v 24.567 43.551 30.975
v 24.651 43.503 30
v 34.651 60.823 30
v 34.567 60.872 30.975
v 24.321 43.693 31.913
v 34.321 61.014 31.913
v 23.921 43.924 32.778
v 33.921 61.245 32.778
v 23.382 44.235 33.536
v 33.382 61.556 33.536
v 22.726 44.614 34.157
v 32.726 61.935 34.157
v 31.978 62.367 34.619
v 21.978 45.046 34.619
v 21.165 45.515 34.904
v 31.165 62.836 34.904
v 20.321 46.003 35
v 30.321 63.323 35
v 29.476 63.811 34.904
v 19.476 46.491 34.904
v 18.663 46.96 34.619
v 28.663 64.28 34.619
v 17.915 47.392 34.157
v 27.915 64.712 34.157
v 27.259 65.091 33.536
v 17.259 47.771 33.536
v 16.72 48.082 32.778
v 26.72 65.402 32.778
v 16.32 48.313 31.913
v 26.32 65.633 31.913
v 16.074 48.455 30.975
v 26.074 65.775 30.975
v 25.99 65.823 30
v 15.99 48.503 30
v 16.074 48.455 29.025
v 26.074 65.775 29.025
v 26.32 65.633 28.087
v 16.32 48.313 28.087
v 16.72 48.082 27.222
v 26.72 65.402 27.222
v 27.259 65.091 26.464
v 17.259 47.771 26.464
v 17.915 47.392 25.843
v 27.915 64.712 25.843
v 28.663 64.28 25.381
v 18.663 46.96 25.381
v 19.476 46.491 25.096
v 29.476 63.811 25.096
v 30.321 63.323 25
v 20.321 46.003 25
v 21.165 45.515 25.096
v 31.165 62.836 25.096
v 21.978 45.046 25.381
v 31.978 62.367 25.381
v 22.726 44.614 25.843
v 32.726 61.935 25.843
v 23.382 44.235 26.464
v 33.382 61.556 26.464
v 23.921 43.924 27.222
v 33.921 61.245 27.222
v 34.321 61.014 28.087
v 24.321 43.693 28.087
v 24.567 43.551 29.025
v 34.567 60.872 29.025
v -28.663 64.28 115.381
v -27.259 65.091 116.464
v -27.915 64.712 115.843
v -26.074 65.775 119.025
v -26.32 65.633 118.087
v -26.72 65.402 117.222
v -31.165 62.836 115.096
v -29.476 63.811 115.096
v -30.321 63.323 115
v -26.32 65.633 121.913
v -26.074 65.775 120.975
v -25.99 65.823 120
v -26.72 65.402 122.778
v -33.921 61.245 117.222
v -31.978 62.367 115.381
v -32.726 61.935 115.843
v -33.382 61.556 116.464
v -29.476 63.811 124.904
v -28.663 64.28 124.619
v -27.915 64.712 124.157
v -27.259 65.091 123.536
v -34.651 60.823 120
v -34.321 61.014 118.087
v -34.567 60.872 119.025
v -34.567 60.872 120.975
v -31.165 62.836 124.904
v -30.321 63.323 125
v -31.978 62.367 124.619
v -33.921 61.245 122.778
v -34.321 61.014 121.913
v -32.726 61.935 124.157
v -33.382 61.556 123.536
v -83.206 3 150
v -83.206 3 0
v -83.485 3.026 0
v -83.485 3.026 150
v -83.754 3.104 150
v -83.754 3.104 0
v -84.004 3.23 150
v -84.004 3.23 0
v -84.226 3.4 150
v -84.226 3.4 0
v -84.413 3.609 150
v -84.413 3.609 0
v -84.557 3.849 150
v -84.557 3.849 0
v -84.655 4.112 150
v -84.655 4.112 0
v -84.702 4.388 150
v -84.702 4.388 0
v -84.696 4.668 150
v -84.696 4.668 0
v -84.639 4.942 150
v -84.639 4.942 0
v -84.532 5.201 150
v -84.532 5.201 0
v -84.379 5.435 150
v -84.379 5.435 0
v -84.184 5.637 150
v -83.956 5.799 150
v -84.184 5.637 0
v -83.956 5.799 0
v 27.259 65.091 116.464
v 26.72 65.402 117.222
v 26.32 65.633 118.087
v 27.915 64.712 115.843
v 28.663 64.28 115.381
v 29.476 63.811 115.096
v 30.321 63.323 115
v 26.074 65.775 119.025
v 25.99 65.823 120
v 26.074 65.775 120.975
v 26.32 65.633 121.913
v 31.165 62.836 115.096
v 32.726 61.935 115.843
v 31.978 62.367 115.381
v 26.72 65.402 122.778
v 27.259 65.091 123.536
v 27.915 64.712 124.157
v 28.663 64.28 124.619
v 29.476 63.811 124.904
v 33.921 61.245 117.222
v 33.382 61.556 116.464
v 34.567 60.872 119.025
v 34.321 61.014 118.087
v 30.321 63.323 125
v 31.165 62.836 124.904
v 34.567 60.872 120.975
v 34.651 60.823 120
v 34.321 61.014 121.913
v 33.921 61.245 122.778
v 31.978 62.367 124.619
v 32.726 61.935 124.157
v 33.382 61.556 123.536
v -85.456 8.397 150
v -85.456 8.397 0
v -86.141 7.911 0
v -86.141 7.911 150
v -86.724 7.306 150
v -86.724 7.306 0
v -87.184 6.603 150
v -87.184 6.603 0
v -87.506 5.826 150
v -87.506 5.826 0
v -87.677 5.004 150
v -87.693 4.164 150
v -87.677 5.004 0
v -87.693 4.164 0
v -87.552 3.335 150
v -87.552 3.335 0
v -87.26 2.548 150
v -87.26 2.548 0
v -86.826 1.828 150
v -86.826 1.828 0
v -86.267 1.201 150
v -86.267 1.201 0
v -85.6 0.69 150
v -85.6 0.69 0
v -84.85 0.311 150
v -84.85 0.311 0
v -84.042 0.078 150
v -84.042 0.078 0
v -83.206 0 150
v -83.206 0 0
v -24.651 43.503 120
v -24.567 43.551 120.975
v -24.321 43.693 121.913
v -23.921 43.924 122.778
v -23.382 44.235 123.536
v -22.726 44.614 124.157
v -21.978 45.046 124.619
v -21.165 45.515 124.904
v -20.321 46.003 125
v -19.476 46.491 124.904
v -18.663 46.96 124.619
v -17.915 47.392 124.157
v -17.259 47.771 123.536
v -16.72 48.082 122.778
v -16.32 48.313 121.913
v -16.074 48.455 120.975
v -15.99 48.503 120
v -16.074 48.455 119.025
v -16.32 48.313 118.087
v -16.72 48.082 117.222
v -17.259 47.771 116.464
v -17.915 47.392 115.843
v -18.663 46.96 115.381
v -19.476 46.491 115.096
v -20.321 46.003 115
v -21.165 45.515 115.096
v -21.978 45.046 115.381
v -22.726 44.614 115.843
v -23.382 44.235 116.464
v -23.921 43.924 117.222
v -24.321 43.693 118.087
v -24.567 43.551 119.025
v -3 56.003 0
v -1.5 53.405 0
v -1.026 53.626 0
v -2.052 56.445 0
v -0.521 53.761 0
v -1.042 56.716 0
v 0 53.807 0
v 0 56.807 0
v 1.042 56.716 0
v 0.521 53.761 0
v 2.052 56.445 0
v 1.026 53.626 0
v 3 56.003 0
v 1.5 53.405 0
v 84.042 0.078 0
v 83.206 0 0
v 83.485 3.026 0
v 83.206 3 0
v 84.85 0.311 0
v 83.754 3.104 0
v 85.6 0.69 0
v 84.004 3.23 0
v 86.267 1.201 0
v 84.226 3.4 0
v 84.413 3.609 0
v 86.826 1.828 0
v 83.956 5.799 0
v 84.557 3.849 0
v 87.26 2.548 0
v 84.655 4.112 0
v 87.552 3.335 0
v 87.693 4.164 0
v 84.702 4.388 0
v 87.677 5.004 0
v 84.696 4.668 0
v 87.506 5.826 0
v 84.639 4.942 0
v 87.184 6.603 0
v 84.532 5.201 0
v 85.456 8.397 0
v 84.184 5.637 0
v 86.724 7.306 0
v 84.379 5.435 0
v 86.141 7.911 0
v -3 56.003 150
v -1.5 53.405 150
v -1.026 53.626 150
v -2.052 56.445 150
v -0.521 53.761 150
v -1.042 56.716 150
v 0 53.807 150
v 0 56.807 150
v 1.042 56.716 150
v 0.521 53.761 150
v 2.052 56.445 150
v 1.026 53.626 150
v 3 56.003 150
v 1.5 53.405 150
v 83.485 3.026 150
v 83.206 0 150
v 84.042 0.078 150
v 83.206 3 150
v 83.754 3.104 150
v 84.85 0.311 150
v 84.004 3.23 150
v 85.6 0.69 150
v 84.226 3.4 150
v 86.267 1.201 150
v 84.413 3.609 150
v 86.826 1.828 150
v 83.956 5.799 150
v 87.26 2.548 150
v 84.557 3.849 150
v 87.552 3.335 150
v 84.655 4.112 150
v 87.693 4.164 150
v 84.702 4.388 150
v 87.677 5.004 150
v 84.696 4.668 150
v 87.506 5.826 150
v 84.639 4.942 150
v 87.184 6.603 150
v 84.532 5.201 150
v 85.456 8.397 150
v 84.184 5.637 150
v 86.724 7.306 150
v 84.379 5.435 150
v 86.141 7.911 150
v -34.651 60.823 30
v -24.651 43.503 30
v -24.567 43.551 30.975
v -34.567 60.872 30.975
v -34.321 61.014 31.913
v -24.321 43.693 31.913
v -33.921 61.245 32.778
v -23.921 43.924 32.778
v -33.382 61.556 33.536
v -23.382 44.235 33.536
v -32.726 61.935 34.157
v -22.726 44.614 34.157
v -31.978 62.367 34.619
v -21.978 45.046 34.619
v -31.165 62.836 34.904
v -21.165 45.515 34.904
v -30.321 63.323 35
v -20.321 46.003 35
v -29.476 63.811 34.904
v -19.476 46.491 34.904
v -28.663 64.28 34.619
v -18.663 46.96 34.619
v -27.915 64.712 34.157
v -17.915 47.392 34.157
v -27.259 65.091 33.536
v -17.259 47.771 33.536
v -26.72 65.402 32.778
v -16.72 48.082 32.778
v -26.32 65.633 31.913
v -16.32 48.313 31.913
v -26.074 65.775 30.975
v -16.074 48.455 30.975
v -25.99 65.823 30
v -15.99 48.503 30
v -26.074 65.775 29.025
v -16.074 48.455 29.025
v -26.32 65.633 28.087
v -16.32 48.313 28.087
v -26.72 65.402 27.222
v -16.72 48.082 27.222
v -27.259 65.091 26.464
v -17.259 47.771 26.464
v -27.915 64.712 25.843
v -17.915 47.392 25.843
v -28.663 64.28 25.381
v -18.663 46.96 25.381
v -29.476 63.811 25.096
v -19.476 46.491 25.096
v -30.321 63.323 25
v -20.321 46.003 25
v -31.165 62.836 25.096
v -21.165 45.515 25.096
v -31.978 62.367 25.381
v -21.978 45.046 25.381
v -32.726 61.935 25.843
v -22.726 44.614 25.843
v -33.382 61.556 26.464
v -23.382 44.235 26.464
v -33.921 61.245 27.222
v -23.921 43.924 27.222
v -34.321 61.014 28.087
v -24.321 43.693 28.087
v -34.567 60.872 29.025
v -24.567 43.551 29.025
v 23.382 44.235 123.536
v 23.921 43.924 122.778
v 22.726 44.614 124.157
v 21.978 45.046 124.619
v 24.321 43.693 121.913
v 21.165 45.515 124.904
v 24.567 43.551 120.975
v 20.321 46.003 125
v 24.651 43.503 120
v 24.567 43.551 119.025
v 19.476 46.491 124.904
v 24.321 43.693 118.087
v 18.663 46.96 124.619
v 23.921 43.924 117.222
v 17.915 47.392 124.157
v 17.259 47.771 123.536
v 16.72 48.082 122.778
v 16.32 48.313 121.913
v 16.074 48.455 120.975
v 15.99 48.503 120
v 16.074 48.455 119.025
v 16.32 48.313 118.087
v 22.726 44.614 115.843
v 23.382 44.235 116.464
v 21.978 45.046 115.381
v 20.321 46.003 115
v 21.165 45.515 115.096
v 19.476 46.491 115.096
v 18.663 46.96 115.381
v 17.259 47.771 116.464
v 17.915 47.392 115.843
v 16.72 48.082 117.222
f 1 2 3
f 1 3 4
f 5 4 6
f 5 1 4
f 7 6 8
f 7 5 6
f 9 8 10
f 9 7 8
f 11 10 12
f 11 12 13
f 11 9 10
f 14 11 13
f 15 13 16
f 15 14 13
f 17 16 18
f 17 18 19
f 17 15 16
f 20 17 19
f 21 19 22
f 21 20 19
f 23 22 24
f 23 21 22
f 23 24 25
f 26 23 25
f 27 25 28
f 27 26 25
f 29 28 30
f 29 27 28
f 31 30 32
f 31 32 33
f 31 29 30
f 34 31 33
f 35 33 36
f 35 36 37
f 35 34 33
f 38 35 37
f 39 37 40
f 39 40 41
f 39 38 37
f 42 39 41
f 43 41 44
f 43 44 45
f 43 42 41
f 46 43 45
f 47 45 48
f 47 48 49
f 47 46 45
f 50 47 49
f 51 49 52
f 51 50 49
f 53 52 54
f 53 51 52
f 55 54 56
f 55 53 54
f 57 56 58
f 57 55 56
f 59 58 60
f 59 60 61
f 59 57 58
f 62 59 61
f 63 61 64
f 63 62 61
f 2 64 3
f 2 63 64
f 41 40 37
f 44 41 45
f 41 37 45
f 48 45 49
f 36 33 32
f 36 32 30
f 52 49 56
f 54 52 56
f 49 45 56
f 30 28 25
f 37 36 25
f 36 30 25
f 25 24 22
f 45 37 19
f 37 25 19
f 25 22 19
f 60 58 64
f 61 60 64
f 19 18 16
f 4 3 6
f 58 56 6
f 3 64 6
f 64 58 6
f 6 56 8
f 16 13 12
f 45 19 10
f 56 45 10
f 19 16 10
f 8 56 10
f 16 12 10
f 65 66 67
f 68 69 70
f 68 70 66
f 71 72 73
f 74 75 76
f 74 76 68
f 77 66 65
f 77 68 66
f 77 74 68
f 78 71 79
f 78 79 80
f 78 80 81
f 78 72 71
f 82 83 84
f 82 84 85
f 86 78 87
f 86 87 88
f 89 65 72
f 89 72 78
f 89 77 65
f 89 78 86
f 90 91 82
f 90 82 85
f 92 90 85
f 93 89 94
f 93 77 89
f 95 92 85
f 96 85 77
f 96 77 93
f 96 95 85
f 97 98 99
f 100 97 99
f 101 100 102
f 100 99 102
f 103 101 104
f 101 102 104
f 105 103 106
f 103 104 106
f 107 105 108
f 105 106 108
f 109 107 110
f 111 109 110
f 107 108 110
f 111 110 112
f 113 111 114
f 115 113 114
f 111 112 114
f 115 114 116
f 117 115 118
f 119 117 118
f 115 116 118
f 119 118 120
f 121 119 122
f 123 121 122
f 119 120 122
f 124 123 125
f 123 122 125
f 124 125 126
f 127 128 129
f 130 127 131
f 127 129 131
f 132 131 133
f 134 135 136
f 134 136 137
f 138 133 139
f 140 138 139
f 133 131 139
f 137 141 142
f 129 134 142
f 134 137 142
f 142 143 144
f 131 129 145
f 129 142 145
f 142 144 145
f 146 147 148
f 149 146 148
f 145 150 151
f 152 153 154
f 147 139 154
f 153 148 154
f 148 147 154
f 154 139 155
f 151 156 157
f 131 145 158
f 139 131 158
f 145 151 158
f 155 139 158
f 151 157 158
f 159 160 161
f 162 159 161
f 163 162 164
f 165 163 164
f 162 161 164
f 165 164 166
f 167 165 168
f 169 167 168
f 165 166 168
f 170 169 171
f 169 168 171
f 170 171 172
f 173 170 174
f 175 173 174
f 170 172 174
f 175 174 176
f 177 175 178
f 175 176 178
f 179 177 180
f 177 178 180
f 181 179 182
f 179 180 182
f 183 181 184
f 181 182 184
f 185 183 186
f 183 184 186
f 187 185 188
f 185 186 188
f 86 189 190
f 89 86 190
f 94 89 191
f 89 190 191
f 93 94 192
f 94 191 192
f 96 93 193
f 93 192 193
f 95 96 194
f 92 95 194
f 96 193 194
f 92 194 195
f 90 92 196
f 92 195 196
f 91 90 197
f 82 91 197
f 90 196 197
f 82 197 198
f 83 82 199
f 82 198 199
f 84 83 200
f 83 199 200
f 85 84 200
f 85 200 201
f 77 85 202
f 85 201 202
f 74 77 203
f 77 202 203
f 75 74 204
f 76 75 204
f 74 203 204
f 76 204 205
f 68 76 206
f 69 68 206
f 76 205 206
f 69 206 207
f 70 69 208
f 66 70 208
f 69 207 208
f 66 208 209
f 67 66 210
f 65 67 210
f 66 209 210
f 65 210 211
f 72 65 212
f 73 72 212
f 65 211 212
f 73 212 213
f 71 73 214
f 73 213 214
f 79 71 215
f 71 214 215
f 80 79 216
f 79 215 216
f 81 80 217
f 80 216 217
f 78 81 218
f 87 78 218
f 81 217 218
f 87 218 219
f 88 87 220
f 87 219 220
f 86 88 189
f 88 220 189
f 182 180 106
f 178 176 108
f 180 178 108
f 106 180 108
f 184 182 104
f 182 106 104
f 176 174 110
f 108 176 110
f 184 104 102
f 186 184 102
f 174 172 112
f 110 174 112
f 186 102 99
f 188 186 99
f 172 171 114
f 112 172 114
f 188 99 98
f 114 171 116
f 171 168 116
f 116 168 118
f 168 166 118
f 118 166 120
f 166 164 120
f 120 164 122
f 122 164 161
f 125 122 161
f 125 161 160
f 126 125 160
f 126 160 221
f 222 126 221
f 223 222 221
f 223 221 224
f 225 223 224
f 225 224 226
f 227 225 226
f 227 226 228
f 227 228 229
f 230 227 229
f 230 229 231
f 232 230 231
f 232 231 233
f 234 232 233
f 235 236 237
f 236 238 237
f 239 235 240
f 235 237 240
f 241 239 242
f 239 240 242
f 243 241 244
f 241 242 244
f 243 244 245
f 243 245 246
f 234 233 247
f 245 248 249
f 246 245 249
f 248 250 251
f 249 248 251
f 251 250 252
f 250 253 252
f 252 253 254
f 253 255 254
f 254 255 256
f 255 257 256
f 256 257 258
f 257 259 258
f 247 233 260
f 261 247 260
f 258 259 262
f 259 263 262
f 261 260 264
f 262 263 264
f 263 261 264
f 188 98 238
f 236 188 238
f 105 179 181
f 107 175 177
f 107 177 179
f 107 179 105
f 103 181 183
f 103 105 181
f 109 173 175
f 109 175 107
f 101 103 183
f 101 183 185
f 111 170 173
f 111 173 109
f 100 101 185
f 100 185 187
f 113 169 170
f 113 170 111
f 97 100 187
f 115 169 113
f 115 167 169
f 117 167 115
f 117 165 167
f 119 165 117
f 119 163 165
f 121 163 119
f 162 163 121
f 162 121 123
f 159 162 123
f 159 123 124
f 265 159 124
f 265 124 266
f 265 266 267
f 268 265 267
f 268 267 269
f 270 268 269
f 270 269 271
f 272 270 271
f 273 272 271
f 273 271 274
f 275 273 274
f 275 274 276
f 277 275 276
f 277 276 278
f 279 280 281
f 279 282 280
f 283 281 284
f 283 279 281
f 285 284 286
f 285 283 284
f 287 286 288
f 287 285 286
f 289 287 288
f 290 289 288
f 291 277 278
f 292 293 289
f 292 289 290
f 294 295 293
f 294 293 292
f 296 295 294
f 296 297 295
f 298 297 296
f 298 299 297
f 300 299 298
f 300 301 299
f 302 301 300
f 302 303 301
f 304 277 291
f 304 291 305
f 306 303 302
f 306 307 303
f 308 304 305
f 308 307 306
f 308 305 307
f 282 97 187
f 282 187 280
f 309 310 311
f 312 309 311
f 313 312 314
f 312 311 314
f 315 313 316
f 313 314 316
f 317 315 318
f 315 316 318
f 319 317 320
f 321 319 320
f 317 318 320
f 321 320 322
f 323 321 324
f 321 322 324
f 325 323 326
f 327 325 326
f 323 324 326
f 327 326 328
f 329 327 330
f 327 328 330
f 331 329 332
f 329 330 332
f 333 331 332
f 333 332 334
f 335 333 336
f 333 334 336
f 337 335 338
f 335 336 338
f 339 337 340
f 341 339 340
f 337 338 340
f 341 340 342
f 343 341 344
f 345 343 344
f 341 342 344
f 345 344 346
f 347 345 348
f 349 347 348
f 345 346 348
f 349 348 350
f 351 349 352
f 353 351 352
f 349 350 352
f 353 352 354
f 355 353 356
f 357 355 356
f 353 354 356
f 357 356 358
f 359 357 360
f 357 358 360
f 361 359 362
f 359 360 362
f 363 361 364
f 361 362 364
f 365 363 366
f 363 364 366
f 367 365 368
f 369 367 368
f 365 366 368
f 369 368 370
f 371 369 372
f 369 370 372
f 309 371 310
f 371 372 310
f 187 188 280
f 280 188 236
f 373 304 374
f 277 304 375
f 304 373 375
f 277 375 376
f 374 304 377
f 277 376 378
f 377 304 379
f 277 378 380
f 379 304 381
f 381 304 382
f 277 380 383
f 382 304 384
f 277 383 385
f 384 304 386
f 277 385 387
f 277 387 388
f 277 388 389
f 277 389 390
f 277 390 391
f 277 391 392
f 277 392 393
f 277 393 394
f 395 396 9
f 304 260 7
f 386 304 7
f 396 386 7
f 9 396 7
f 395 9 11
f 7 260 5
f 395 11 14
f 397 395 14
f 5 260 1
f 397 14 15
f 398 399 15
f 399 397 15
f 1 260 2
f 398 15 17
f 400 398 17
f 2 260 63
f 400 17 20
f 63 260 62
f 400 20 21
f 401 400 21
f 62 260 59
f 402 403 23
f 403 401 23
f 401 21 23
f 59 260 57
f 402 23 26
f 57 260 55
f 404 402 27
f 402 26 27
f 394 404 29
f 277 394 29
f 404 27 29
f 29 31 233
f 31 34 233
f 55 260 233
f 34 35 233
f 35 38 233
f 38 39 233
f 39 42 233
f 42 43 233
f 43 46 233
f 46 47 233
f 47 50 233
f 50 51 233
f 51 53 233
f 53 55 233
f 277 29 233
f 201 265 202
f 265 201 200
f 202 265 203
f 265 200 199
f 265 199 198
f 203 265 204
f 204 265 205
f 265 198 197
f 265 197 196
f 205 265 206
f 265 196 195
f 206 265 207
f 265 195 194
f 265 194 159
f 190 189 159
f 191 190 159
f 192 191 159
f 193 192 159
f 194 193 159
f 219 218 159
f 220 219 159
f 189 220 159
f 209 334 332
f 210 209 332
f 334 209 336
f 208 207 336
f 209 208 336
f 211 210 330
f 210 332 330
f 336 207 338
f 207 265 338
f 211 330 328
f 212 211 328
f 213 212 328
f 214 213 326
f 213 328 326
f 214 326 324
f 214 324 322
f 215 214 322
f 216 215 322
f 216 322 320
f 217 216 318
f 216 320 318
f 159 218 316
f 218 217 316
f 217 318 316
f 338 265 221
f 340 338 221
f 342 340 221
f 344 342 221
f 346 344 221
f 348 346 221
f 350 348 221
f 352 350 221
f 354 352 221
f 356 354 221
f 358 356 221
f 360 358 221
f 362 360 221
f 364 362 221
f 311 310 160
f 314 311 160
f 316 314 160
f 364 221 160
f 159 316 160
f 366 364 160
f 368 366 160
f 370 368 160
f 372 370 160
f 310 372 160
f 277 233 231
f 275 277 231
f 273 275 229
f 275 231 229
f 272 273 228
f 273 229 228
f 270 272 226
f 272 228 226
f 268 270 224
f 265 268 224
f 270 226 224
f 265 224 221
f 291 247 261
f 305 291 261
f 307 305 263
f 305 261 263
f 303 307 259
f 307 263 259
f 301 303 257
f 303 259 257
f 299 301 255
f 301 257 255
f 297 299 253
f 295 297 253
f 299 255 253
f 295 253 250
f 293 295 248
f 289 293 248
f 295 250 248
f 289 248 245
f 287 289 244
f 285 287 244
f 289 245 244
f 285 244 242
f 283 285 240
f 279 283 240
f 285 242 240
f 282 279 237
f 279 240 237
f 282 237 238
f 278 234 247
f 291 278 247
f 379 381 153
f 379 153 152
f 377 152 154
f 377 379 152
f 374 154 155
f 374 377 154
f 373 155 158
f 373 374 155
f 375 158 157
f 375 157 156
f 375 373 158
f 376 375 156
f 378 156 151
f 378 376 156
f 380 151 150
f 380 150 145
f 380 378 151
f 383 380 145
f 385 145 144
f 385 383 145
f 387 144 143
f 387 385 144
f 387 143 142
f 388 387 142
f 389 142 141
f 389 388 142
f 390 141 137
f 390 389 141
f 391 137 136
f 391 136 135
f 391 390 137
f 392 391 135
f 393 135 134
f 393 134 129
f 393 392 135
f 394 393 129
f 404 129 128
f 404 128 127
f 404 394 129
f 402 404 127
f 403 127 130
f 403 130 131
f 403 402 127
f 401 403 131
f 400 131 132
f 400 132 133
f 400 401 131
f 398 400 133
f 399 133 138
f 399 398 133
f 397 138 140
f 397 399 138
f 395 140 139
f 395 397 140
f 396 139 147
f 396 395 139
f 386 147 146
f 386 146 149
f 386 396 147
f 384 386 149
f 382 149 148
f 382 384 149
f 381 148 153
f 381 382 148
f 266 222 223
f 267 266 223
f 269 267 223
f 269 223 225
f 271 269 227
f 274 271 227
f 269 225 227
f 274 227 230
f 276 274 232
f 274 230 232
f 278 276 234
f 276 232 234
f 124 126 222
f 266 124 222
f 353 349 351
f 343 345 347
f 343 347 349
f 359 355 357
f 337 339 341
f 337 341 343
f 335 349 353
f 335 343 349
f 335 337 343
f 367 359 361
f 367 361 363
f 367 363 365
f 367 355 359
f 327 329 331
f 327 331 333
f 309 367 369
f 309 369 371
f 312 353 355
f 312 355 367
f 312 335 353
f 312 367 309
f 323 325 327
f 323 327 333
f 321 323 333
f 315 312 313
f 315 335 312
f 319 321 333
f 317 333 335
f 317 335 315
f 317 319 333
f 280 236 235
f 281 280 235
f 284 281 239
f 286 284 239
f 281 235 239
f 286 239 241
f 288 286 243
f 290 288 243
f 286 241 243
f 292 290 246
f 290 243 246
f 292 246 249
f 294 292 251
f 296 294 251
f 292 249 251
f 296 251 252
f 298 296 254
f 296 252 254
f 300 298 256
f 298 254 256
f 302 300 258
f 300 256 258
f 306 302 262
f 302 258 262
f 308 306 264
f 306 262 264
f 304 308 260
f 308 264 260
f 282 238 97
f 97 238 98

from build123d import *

# Parameters (mm, degrees)
F1_DEPTH = 150
F2_R     = 5
F3_DEPTH = 20


# Not quite as in the source:
# - a pattern or mirror of a feature is missing from the dataset's text; its kind, count and spacing are read off the source's solid


with BuildPart() as f1:
    # F0 (on Top) → F1 (new body)
    with BuildSketch(Plane.XY):
        with BuildLine():
            Line((-83.2057713659, 0), (0, 0))
            Line((0, 0), (83.2057713659, 0))
            ThreePointArc((83.2057713659, 0), (87.5524375842, 3.335314297), (85.4557713659, 8.397114317))
            Line((85.4557713659, 8.397114317), (3, 56.0029761114))
            ThreePointArc((3, 56.0029761114), (0, 56.8068236887), (-3, 56.0029761114))
            Line((-3, 56.0029761114), (-85.4557713659, 8.397114317))
            ThreePointArc((-85.4557713659, 8.397114317), (-87.5524375842, 3.335314297), (-83.2057713659, 0))
        make_face()
        with BuildLine():
            Line((83.2057713659, 3), (0, 3))
            Line((0, 3), (-83.2057713659, 3))
            ThreePointArc((-83.2057713659, 3), (-84.6546601054, 4.1117714323), (-83.9557713659, 5.7990381057))
            Line((-83.9557713659, 5.7990381057), (-1.5, 53.4048999))
            ThreePointArc((-1.5, 53.4048999), (0, 53.8068236887), (1.5, 53.4048999))
            Line((1.5, 53.4048999), (83.9557713659, 5.7990381057))
            ThreePointArc((83.9557713659, 5.7990381057), (84.6546601054, 4.1117714323), (83.2057713659, 3))
        make_face(mode=Mode.SUBTRACT)
    extrude(amount=F1_DEPTH)

    # F2 (on face) → F3 (join)
    with BuildSketch(Plane(origin=(-25, 43.3012701892, 0), x_dir=(-0.8660254038, -0.5, 0), z_dir=(-0.5, 0.8660254038, 0))):
        with Locations((-5.4034118443, 30)):
            Circle(F2_R)
        with Locations((-5.4034118443, 120)):
            Circle(F2_R)
    f3 = extrude(amount=F3_DEPTH)

    # F3_copies: F3 across plane
    add(f3.mirror(Plane(origin=(0, 0, 0), x_dir=(0, 0, 1), z_dir=(1, 0, 0))))


solid = f1.part
